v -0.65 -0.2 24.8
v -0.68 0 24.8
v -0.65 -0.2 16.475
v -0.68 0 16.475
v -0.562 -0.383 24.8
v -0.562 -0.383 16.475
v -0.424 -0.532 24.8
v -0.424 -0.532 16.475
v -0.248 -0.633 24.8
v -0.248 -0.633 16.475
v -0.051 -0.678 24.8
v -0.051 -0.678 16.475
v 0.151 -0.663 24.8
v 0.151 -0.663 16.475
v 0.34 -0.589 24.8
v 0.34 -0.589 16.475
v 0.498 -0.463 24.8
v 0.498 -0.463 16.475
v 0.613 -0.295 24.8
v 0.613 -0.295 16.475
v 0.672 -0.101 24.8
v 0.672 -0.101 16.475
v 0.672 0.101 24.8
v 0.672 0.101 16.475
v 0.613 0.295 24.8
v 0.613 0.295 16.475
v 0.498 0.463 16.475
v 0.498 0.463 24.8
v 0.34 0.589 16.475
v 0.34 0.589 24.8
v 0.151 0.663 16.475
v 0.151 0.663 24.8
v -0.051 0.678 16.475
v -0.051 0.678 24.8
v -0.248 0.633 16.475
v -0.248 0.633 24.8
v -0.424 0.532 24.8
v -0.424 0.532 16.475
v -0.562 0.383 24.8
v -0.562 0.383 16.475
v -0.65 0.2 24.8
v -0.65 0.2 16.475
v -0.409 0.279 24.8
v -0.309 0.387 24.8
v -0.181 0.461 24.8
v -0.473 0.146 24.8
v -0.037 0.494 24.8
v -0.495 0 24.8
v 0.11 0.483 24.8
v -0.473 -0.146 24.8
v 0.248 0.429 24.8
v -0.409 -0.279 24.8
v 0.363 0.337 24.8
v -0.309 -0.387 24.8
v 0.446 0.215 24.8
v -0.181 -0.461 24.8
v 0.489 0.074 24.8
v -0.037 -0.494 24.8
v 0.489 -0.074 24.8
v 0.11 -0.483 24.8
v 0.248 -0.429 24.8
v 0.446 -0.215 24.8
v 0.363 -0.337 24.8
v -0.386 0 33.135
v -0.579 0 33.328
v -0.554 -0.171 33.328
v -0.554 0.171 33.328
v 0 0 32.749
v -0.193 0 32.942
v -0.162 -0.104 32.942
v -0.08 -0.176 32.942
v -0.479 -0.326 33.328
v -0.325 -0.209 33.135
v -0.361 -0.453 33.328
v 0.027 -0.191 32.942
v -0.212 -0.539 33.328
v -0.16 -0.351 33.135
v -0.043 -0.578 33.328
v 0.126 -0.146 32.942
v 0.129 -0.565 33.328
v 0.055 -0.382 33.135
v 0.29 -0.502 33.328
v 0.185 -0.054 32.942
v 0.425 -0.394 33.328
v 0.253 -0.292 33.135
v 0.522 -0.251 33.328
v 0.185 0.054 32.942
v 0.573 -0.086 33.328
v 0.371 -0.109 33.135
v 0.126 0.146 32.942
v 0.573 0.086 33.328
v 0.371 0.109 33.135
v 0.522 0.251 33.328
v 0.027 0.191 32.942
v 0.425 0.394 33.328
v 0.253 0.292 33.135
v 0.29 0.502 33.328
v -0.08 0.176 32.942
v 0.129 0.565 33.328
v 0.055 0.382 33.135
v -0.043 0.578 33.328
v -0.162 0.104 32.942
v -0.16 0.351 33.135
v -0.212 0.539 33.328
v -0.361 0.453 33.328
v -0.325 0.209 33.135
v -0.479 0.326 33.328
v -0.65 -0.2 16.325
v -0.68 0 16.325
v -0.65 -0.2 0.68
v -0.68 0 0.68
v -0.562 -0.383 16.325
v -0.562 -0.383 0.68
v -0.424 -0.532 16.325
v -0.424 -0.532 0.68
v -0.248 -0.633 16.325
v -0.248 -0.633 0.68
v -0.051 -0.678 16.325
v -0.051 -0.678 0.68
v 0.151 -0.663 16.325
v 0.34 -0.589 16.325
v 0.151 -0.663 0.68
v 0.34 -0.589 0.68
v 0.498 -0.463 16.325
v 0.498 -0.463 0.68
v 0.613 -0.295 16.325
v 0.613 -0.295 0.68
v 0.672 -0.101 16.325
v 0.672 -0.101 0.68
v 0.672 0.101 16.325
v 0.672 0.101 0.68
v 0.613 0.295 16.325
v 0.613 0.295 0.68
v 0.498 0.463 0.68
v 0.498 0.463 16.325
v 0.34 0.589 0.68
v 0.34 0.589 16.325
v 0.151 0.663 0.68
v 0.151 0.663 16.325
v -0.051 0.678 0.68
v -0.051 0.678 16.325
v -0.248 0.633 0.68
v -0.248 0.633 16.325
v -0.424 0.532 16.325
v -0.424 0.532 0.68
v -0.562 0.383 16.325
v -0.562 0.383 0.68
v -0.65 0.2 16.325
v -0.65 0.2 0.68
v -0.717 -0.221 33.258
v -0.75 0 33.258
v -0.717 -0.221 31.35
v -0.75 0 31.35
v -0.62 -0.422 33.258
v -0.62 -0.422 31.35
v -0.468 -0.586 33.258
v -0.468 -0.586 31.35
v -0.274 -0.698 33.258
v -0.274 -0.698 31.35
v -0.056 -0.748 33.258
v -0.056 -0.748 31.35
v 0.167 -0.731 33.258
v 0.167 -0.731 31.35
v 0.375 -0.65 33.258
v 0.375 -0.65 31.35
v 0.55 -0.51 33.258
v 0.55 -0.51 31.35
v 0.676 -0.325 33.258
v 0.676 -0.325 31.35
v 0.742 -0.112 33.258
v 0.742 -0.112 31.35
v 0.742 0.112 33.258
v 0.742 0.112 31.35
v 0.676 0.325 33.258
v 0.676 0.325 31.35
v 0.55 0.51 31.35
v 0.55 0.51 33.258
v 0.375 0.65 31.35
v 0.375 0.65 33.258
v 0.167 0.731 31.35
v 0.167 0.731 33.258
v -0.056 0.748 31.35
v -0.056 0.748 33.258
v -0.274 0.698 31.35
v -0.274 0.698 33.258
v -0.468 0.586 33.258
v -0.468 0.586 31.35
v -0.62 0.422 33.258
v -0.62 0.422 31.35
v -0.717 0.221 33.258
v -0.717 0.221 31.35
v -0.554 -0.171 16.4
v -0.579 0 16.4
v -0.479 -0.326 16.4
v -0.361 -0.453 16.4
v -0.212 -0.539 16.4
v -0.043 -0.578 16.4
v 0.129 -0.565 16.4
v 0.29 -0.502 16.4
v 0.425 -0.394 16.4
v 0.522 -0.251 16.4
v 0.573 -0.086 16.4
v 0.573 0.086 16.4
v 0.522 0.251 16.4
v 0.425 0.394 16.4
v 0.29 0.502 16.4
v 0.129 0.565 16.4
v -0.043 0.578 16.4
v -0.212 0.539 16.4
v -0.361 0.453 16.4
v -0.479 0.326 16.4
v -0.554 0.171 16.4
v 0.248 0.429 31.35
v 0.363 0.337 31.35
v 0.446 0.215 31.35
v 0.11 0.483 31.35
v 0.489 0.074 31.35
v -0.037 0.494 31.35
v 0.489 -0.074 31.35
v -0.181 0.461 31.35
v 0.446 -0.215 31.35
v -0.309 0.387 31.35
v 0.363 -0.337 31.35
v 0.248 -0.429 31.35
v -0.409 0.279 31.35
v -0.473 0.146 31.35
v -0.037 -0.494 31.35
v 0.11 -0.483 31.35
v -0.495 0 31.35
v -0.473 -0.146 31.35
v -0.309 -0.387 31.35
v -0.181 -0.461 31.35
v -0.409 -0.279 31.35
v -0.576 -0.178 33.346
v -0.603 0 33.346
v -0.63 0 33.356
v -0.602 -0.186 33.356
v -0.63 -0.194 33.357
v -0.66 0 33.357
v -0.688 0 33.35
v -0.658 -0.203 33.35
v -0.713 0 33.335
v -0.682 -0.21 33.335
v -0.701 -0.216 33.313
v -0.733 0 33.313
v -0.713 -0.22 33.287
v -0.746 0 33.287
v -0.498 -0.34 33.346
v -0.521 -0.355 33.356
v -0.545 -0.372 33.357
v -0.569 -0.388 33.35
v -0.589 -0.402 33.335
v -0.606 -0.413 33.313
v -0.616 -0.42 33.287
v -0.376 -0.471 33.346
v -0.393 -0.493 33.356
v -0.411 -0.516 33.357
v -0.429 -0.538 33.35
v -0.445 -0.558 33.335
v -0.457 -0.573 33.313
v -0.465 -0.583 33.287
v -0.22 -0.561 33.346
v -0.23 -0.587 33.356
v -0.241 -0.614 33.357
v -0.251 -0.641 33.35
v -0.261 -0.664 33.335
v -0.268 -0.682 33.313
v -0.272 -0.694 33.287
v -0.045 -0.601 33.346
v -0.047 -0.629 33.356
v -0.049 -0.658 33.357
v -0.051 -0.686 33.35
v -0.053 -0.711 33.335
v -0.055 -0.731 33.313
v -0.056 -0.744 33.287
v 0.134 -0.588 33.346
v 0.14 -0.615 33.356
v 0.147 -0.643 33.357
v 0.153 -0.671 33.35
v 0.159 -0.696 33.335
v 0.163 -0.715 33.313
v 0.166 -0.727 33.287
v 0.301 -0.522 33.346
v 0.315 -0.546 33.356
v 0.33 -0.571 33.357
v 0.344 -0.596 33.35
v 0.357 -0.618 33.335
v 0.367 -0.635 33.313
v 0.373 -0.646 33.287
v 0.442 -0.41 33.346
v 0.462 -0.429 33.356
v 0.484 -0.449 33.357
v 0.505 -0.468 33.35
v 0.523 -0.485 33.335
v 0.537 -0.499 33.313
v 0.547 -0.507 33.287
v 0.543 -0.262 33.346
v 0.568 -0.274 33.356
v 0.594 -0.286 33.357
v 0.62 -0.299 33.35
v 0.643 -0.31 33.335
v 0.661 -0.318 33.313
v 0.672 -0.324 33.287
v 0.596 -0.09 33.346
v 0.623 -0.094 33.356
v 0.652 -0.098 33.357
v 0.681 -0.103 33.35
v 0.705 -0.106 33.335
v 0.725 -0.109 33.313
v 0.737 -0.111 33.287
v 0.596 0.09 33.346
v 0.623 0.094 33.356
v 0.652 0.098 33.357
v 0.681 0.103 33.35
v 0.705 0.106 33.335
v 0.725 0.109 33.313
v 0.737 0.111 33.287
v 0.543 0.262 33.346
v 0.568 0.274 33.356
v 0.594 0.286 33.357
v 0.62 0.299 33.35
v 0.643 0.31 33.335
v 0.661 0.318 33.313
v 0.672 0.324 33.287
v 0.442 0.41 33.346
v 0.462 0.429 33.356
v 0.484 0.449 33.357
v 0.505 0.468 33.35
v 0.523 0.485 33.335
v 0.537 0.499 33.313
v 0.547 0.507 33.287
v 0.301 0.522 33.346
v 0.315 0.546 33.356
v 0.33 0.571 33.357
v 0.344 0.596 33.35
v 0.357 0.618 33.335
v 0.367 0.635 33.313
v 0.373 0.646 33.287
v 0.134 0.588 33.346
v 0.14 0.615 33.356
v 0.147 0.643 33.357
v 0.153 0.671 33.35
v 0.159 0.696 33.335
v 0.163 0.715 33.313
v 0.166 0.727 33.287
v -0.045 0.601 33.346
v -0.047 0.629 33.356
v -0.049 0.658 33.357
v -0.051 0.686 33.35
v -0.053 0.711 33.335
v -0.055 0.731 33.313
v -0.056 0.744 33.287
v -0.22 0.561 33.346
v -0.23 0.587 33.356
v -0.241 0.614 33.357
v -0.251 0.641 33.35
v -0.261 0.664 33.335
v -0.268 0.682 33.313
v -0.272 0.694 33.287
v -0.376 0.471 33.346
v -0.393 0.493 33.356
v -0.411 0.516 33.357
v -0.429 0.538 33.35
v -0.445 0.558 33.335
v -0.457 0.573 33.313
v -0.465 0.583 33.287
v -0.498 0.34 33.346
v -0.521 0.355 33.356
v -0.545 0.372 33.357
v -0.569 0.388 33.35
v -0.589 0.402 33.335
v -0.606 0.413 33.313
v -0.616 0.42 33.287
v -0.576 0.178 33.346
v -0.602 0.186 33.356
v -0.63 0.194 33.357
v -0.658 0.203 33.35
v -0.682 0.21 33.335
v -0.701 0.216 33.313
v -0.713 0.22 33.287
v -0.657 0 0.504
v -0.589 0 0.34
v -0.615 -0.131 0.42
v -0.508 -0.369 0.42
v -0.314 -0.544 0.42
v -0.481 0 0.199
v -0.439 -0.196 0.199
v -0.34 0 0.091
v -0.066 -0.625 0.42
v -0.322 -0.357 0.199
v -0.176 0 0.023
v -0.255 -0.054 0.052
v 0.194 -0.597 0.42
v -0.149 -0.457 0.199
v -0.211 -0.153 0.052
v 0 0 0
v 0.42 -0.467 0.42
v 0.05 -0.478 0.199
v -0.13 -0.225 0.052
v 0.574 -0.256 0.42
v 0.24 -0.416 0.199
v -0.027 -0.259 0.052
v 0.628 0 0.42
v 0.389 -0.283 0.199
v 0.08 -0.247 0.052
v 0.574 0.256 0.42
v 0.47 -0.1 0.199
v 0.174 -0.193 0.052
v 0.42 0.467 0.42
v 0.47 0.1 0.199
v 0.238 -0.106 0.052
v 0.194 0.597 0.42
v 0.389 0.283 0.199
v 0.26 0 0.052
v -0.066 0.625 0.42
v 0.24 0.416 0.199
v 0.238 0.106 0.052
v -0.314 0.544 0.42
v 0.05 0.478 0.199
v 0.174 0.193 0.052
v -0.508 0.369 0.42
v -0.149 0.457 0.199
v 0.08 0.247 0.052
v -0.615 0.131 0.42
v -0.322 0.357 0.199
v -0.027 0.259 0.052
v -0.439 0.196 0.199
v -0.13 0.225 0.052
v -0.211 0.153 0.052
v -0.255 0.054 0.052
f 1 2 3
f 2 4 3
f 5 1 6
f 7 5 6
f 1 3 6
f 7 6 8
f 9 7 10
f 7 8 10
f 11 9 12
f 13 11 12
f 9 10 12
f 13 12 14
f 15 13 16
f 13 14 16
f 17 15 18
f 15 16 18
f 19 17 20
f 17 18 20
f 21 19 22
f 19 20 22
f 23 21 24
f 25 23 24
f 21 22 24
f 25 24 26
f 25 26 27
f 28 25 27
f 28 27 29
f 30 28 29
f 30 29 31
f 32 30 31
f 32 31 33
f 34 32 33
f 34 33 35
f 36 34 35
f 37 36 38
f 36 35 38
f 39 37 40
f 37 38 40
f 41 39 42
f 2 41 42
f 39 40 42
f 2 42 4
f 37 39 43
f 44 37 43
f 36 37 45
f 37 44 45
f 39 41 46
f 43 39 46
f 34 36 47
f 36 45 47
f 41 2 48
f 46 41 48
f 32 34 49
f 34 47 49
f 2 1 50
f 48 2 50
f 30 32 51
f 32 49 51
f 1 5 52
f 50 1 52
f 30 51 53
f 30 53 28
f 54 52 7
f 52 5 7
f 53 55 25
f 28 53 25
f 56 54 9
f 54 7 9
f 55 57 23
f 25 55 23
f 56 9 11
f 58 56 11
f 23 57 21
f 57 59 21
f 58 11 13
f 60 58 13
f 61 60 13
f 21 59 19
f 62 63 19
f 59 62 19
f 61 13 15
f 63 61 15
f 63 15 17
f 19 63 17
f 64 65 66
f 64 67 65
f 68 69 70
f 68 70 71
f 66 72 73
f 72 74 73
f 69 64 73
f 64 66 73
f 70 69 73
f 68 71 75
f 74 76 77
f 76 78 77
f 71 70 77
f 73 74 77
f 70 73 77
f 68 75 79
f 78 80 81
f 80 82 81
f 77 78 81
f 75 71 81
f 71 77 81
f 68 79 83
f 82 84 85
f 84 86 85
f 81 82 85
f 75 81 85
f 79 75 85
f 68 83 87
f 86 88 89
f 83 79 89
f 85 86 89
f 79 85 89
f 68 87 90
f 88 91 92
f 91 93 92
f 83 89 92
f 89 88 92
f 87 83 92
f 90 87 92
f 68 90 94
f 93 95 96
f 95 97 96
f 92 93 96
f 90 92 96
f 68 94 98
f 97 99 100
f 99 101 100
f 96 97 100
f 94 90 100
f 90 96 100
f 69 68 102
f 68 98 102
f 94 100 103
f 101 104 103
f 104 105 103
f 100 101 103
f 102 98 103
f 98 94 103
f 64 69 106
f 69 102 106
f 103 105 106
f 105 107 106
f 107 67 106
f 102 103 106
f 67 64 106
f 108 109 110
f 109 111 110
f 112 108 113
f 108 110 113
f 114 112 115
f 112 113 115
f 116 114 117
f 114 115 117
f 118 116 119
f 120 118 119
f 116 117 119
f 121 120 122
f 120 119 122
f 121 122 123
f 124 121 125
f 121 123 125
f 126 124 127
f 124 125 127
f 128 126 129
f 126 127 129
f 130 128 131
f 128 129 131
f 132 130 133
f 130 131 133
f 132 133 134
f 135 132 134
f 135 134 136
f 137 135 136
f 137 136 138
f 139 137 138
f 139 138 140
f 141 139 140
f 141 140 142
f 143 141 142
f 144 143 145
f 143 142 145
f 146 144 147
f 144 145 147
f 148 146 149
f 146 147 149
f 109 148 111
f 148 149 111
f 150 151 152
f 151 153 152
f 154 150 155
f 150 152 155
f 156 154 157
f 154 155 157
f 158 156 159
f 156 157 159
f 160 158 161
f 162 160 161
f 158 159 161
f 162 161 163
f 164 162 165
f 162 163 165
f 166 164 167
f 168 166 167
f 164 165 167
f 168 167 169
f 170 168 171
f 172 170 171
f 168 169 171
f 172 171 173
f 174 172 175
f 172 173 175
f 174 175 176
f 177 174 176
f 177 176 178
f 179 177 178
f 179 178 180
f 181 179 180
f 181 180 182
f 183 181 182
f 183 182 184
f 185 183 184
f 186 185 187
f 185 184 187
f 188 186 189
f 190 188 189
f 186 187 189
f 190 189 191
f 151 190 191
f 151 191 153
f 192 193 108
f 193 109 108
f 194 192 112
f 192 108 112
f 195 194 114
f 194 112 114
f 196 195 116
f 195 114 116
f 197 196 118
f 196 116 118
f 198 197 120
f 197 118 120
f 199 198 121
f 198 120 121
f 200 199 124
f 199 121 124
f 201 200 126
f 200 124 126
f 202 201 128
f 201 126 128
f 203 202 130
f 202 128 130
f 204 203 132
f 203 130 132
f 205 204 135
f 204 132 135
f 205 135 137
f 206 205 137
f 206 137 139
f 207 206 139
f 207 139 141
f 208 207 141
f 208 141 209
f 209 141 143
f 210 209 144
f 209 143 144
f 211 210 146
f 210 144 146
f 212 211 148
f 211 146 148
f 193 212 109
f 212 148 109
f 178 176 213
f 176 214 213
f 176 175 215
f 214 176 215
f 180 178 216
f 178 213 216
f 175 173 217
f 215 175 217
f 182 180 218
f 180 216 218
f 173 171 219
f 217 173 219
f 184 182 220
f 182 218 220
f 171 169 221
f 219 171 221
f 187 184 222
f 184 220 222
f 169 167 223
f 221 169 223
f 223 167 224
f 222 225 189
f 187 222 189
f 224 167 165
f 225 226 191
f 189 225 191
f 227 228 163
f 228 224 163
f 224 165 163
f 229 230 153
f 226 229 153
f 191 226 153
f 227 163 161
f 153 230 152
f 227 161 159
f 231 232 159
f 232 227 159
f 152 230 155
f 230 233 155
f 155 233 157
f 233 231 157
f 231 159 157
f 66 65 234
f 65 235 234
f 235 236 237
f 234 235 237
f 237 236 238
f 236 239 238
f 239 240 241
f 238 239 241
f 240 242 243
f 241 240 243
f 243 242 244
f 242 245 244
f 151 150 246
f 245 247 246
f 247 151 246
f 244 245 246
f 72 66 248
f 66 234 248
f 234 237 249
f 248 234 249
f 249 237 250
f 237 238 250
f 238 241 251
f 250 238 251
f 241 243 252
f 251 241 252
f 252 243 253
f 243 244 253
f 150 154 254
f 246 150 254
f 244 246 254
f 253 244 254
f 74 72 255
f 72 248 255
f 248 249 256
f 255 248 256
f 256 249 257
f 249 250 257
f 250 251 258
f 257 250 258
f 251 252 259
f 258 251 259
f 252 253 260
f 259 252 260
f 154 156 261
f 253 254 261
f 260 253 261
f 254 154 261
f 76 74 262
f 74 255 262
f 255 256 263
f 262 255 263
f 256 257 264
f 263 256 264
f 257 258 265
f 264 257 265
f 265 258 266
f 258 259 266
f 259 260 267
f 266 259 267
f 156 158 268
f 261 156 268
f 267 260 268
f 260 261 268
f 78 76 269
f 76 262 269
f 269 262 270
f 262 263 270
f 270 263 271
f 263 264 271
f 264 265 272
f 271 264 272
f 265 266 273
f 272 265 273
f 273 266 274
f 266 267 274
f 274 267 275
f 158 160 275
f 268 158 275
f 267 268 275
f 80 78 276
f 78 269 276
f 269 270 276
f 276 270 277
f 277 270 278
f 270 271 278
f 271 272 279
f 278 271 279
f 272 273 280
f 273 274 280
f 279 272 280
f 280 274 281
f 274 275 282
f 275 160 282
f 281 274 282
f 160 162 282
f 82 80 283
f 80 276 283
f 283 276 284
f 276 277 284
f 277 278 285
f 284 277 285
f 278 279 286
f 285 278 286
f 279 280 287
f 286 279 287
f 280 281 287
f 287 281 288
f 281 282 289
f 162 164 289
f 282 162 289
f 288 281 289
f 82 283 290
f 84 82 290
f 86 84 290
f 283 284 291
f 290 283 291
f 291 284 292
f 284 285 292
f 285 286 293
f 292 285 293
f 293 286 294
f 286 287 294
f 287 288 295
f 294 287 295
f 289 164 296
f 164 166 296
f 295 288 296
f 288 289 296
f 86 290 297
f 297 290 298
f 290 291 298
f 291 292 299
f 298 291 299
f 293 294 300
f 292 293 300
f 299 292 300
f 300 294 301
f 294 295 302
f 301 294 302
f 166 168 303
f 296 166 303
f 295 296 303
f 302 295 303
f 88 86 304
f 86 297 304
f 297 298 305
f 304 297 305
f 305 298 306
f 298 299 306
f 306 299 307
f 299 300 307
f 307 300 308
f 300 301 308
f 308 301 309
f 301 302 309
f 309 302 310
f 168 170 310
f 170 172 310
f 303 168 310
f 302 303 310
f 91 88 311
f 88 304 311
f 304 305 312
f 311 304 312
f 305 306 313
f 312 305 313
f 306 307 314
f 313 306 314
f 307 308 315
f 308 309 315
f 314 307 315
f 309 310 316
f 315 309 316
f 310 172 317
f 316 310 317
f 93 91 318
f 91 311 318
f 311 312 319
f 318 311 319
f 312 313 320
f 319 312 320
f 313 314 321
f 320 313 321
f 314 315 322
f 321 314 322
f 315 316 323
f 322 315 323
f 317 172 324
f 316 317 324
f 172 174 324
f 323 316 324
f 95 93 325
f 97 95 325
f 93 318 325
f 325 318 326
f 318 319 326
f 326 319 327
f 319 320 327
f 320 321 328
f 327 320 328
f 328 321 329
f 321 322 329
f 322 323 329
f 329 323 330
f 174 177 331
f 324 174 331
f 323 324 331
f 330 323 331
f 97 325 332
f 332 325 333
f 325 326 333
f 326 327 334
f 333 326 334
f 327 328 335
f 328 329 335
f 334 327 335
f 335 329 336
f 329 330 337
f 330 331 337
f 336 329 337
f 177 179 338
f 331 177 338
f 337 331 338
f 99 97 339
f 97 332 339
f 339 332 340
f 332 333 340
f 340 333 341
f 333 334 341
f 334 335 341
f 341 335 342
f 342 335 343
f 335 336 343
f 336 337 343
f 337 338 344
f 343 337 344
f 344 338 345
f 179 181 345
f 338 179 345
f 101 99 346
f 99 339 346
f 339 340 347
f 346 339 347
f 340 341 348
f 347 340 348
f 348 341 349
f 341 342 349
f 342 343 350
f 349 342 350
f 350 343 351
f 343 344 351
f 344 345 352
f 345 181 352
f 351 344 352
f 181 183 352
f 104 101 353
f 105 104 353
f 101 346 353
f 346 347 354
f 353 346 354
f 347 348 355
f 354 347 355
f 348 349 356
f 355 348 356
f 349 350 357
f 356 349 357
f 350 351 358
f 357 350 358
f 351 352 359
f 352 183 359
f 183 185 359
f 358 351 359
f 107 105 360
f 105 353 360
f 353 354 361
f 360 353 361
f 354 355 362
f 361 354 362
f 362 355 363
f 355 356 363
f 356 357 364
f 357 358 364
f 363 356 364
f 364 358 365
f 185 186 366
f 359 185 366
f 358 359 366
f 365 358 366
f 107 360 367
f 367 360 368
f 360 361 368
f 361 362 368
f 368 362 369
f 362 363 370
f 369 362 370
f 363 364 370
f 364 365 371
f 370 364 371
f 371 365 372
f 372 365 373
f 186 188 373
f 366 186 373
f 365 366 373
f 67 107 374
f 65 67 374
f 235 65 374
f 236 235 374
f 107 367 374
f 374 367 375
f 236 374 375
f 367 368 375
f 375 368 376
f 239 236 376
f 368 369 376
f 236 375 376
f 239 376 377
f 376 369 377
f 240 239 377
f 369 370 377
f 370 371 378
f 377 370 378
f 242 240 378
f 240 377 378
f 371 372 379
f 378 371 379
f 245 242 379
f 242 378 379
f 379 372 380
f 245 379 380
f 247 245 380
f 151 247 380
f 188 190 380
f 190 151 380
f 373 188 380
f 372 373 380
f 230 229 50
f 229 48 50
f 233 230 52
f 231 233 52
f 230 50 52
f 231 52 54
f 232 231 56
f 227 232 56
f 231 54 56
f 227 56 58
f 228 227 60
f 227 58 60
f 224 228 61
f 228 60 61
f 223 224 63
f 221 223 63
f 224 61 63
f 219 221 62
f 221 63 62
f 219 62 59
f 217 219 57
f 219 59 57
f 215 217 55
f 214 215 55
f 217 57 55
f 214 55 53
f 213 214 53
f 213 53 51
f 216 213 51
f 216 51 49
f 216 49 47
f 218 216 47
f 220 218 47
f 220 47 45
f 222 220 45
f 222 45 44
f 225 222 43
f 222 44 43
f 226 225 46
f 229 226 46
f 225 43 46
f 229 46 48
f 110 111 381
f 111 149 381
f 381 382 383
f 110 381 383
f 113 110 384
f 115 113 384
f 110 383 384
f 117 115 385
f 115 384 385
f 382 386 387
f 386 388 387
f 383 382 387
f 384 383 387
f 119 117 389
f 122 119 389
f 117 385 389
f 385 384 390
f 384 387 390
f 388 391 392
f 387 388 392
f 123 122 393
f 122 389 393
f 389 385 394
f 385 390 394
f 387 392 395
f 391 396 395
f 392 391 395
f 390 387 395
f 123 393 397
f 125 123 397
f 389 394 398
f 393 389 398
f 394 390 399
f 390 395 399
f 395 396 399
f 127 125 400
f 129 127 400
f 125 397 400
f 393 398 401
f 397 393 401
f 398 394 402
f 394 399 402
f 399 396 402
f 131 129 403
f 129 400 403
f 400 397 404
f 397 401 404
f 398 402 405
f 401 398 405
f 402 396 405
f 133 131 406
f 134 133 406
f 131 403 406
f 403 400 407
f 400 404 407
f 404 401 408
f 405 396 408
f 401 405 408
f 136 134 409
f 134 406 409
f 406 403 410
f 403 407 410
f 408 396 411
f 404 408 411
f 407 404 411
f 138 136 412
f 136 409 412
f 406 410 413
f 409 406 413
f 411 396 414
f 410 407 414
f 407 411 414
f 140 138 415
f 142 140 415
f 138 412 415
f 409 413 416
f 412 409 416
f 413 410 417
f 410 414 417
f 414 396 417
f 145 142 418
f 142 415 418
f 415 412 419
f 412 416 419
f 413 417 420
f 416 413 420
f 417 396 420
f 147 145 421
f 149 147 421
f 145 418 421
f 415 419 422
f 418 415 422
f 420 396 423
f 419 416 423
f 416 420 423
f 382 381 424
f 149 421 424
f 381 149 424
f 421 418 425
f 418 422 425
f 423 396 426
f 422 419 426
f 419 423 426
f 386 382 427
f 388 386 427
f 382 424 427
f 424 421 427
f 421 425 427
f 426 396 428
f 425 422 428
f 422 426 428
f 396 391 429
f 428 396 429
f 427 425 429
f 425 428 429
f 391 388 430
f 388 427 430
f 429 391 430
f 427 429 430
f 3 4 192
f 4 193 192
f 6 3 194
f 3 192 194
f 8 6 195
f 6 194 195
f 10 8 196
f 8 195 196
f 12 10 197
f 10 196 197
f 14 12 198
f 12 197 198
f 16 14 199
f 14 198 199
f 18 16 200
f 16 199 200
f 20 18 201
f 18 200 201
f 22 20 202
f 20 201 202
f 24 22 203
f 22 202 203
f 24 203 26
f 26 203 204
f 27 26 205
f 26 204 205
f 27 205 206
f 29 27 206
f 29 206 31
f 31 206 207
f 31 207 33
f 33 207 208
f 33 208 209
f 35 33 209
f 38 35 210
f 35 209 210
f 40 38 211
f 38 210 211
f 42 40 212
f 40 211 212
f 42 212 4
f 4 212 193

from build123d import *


with BuildPart() as part:
    # Эскиз1 → Повернуть1 (revolve)
    with BuildSketch(Plane(origin=(0, 0, 0), x_dir=(1, 0, 0), z_dir=(0, 1, 0))):
        with BuildLine():
            Line((0, 0), (0, -32.749033403))
            Line((0, -32.749033403), (-0.579289322, -33.328322725))
            ThreePointArc((-0.579289322, -33.328322725), (-0.688268343, -33.35), (-0.75, -33.257612047))
            Line((-0.75, -33.257612047), (-0.75, -31.35))
            Line((-0.75, -31.35), (-0.495, -31.35))
            Line((-0.495, -31.35), (-0.495, -24.8))
            Line((-0.495, -24.8), (-0.68, -24.8))
            Line((-0.68, -24.8), (-0.68, -16.475))
            Line((-0.68, -16.475), (-0.579289322, -16.4))
            Line((-0.579289322, -16.4), (-0.68, -16.325))
            Line((-0.68, -16.325), (-0.68, -0.68))
            ThreePointArc((-0.68, -0.68), (-0.480832611, -0.199167389), (0, 0))
        make_face()
    revolve(axis=Axis((0, 0, 0), (0, 0, 1)))


solid = part.part
